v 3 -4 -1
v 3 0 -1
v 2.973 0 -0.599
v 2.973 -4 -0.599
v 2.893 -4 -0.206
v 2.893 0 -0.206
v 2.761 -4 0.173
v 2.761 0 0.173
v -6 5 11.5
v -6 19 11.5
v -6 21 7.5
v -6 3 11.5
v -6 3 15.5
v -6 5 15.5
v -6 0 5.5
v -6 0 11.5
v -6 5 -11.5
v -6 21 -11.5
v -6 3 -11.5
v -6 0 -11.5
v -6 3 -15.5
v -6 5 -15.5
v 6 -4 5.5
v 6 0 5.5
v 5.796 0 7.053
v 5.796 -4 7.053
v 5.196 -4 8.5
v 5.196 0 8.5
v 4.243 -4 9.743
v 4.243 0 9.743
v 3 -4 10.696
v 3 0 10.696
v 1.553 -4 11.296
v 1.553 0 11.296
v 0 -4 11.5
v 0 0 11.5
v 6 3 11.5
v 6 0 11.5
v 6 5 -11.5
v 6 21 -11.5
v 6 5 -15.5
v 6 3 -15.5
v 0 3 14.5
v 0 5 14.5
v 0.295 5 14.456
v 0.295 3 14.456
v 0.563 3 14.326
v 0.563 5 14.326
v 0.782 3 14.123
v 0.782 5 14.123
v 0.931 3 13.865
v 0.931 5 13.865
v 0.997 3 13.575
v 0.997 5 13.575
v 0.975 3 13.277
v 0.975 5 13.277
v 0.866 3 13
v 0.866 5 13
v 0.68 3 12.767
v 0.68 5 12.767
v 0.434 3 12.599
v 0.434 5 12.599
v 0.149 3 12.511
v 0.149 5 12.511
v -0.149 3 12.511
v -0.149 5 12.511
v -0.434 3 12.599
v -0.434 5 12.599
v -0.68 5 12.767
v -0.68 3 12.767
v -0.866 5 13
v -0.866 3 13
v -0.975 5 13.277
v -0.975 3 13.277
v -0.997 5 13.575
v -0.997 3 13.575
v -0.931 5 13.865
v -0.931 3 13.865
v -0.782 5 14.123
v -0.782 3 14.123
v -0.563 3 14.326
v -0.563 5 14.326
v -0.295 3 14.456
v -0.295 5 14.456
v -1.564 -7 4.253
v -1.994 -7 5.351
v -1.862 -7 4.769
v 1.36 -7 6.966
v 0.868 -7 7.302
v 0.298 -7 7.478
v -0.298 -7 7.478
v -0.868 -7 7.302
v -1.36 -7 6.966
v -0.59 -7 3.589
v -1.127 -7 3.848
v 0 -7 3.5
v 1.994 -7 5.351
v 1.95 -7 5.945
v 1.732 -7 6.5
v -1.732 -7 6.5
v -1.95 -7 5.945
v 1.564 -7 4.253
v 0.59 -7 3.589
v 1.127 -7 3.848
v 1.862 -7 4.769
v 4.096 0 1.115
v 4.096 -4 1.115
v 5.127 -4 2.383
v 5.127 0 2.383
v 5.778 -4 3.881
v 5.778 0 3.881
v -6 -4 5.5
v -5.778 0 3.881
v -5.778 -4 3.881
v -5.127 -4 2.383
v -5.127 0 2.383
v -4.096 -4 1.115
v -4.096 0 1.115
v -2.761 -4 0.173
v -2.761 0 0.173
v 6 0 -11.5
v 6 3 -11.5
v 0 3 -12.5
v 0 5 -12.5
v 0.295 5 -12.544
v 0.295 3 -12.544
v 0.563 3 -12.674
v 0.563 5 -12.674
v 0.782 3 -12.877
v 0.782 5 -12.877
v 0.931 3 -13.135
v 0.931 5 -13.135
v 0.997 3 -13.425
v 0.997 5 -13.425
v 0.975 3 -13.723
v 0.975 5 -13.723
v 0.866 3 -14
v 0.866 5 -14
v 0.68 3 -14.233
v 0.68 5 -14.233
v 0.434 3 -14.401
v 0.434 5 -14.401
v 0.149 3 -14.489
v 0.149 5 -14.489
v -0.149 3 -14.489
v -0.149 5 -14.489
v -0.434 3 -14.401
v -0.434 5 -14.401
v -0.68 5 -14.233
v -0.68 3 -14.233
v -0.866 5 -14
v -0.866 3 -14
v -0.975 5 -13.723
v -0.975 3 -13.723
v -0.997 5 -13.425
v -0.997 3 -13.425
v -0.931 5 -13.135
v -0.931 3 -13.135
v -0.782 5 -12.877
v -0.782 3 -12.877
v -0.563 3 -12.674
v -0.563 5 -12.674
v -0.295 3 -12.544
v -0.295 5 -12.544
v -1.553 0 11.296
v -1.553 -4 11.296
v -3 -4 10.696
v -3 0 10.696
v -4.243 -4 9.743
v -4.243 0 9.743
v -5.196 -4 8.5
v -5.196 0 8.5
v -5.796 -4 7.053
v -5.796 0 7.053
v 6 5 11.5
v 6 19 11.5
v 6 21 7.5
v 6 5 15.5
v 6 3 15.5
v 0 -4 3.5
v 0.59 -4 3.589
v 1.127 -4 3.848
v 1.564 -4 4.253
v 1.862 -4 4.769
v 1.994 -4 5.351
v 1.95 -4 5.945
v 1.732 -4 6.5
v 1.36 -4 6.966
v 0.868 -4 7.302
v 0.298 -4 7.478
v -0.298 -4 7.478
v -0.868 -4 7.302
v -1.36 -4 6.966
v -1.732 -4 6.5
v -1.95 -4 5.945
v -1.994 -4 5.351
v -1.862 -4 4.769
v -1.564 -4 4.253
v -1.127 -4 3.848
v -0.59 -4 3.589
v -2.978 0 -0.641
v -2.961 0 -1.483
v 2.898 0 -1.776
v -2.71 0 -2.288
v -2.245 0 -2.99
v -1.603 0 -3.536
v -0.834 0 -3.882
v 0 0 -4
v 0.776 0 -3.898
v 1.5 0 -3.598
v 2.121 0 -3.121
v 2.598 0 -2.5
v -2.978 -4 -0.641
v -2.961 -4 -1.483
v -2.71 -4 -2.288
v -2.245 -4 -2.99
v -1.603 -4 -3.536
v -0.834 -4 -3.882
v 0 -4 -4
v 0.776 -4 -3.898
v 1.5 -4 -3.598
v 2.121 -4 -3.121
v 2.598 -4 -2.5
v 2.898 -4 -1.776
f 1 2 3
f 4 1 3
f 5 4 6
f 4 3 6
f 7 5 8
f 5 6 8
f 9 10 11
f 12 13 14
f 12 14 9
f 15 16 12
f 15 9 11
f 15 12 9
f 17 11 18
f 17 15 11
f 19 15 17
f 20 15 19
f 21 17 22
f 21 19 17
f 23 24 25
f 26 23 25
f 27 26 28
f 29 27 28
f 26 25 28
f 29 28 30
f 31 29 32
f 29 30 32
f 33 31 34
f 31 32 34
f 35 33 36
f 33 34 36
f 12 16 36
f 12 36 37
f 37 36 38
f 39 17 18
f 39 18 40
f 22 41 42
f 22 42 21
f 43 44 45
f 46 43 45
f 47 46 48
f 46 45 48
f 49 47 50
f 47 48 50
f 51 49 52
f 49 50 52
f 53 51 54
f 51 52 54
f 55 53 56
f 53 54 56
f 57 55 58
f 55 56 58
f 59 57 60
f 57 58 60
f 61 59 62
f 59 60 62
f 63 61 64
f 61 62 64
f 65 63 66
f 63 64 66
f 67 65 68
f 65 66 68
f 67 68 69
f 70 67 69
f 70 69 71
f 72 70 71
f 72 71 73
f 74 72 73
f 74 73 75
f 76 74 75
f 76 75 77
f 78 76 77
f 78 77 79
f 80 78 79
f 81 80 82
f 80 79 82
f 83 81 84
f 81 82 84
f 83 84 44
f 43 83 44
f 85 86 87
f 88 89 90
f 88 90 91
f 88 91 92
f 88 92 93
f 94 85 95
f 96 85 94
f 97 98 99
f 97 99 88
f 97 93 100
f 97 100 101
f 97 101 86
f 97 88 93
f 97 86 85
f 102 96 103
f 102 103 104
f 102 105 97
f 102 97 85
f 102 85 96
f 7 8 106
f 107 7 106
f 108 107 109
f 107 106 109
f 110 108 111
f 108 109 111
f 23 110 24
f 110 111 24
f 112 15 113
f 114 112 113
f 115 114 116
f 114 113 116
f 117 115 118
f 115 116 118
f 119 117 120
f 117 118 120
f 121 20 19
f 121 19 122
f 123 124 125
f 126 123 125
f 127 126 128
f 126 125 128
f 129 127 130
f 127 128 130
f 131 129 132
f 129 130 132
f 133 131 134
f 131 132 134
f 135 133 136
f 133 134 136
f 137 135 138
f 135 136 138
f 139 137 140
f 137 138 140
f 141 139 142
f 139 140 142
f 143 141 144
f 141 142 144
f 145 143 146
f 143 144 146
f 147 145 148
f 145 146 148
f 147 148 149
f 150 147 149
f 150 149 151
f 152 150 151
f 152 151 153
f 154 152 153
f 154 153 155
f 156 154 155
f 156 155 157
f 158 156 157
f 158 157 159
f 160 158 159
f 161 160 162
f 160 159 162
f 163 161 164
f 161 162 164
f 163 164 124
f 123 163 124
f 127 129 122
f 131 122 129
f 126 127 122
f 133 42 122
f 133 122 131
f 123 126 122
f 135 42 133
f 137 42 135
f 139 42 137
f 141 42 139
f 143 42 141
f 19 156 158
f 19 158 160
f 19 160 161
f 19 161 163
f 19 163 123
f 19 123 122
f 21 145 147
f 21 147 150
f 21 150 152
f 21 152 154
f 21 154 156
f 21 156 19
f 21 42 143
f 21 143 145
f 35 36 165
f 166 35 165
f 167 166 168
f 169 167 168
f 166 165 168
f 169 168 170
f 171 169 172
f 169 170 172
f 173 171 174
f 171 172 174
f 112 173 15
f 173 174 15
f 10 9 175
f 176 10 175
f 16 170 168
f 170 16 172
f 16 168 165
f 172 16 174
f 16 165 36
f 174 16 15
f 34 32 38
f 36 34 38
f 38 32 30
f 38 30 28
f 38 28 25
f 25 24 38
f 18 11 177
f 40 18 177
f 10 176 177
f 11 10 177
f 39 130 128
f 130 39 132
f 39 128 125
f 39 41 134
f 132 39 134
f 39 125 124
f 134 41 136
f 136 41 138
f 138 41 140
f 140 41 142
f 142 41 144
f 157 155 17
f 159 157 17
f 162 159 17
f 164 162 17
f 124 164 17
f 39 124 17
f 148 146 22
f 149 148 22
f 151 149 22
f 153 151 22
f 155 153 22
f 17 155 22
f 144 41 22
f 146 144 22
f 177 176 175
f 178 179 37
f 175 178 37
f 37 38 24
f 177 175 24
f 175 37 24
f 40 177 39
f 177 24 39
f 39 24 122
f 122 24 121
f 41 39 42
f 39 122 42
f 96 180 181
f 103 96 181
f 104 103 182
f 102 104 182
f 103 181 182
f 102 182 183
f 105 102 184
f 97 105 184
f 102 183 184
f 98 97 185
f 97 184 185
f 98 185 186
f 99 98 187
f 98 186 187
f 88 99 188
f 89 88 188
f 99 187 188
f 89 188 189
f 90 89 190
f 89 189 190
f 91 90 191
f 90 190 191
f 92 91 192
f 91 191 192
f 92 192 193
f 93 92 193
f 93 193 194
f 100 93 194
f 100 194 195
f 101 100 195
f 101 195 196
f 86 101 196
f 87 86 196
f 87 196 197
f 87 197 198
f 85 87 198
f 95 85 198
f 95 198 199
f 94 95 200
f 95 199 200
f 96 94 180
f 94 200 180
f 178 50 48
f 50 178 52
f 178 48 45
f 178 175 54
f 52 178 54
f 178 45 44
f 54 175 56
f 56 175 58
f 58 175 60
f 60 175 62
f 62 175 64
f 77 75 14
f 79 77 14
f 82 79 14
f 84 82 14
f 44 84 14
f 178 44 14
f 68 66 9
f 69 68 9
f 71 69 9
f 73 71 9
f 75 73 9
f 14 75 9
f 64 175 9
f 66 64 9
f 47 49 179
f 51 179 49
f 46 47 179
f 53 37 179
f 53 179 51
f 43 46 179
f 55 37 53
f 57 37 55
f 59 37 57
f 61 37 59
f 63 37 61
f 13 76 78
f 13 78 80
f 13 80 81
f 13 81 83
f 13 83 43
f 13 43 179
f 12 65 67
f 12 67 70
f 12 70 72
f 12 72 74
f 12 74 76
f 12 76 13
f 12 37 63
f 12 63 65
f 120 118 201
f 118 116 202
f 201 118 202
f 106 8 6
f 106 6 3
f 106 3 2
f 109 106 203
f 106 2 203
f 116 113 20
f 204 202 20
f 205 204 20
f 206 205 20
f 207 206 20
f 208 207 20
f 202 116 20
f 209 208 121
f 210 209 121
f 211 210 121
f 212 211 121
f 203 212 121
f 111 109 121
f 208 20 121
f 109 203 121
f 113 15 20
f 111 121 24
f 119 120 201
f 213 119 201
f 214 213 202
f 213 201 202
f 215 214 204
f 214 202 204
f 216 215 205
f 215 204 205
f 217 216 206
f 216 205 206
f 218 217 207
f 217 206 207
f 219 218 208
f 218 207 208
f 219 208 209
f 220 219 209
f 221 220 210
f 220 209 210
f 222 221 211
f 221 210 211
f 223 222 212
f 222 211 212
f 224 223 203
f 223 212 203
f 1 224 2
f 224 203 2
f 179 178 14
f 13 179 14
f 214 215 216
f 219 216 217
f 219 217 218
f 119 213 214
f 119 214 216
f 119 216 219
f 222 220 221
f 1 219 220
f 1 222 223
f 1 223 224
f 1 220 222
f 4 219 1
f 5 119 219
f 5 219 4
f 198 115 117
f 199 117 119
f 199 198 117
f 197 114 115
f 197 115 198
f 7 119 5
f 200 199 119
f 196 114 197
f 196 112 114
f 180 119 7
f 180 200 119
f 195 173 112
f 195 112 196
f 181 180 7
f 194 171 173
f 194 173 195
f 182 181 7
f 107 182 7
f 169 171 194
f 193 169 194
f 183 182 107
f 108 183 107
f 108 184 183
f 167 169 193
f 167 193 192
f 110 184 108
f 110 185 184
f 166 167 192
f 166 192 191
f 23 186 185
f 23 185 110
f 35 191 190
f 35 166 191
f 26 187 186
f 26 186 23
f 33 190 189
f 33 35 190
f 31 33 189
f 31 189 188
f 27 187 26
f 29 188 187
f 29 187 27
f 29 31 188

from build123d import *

# Parameters (mm, degrees)
SKETCH_1_W          = 12
SKETCH_1_H          = 23
EXTRUDE_1_DEPTH     = 21
SKETCH_2_W          = 12
SKETCH_2_H          = 4
EXTRUDE_2_DEPTH     = 2
SKETCH_3_R          = 1
CUT_EXTRUDE_2_DEPTH = 2
SKETCH_4_R          = 1
CUT_EXTRUDE_3_DEPTH = 2
EXTRUDE_3_DEPTH     = 4
SKETCH_6_R          = 2
EXTRUDE_4_DEPTH     = 3
CUT_EXTRUDE_4_DEPTH = 29.727164844


with BuildPart() as part:
    # 草图1 → 凸台-拉伸1 (new body)
    with BuildSketch(Plane(origin=(0, 0, 0), x_dir=(1, 0, 0), z_dir=(0, 1, 0))):
        Rectangle(SKETCH_1_W, SKETCH_1_H)
    extrude(amount=EXTRUDE_1_DEPTH)

    # 草图2 → 凸台-拉伸2 (add)
    with BuildSketch(Plane(origin=(0, 5, 0), x_dir=(-1, 0, 0), z_dir=(0, -1, 0))):
        with Locations((0, -13.5)):
            Rectangle(SKETCH_2_W, SKETCH_2_H)
        with Locations((0, 13.5)):
            Rectangle(SKETCH_2_W, SKETCH_2_H)
    extrude(amount=EXTRUDE_2_DEPTH)

    # 草图3 → 切除-拉伸2 (cut)
    with BuildSketch(Plane(origin=(0, 5, 0), x_dir=(1, 0, 0), z_dir=(0, 1, 0))):
        with Locations(Location((0, -13.5, 0), (0, 0, 270))):
            Circle(SKETCH_3_R)
    extrude(amount=-CUT_EXTRUDE_2_DEPTH, mode=Mode.SUBTRACT)

    # 草图4 → 切除-拉伸3 (cut)
    with BuildSketch(Plane(origin=(0, 5, 0), x_dir=(1, 0, 0), z_dir=(0, 1, 0))):
        with Locations(Location((0, 13.5, 0), (0, 0, 270))):
            Circle(SKETCH_4_R)
    extrude(amount=-CUT_EXTRUDE_3_DEPTH, mode=Mode.SUBTRACT)

    # 草图5 → 凸台-拉伸3 (add)
    with BuildSketch(Plane.XZ):
        with BuildLine():
            ThreePointArc((6, 5.5), (4.242640687, 9.742640687), (0, 11.5))
            Line((0, 11.5), (0, 2))
            ThreePointArc((0, 2), (1.655410709, 1.501922338), (2.761139354, 0.173076923))
            ThreePointArc((2.761139354, 0.173076923), (5.126735615, 2.382856767), (6, 5.5))
        make_face()
        with BuildLine():
            Line((0, 2), (0, 11.5))
            ThreePointArc((0, 11.5), (-4.242640687, 9.742640687), (-6, 5.5))
            ThreePointArc((-6, 5.5), (-5.126735615, 2.382856767), (-2.761139354, 0.173076923))
            ThreePointArc((-2.761139354, 0.173076923), (-1.655410709, 1.501922338), (0, 2))
        make_face()
        with BuildLine():
            ThreePointArc((2.761139354, 0.173076923), (1.655410709, 1.501922338), (0, 2))
            Line((0, 2), (0, -0.5))
            ThreePointArc((0, -0.5), (1.4209964, -0.329302637), (2.761139354, 0.173076923))
        make_face()
        with BuildLine():
            Line((0, -0.5), (0, 2))
            ThreePointArc((0, 2), (-1.655410709, 1.501922338), (-2.761139354, 0.173076923))
            ThreePointArc((-2.761139354, 0.173076923), (-1.4209964, -0.329302637), (0, -0.5))
        make_face()
        with BuildLine():
            ThreePointArc((2.761139354, 0.173076923), (1.4209964, -0.329302637), (0, -0.5))
            Line((0, -0.5), (0, -4))
            ThreePointArc((0, -4), (2.121320344, -3.121320344), (3, -1))
            ThreePointArc((3, -1), (2.939678389, -0.401425887), (2.761139354, 0.173076923))
        make_face()
        with BuildLine():
            Line((0, -4), (0, -0.5))
            ThreePointArc((0, -0.5), (-1.4209964, -0.329302637), (-2.761139354, 0.173076923))
            ThreePointArc((-2.761139354, 0.173076923), (-2.501922338, -2.655410709), (0, -4))
        make_face()
        with BuildLine():
            ThreePointArc((6, 5.5), (4.242640687, 9.742640687), (0, 11.5))
            Line((0, 11.5), (0, 2))
            ThreePointArc((0, 2), (1.655410709, 1.501922338), (2.761139354, 0.173076923))
            ThreePointArc((2.761139354, 0.173076923), (5.126735615, 2.382856767), (6, 5.5))
        make_face()
        with BuildLine():
            Line((0, 2), (0, 11.5))
            ThreePointArc((0, 11.5), (-4.242640687, 9.742640687), (-6, 5.5))
            ThreePointArc((-6, 5.5), (-5.126735615, 2.382856767), (-2.761139354, 0.173076923))
            ThreePointArc((-2.761139354, 0.173076923), (-1.655410709, 1.501922338), (0, 2))
        make_face()
        with BuildLine():
            ThreePointArc((2.761139354, 0.173076923), (1.655410709, 1.501922338), (0, 2))
            Line((0, 2), (0, -0.5))
            ThreePointArc((0, -0.5), (1.4209964, -0.329302637), (2.761139354, 0.173076923))
        make_face()
        with BuildLine():
            Line((0, -0.5), (0, 2))
            ThreePointArc((0, 2), (-1.655410709, 1.501922338), (-2.761139354, 0.173076923))
            ThreePointArc((-2.761139354, 0.173076923), (-1.4209964, -0.329302637), (0, -0.5))
        make_face()
        with BuildLine():
            ThreePointArc((2.761139354, 0.173076923), (1.4209964, -0.329302637), (0, -0.5))
            Line((0, -0.5), (0, -4))
            ThreePointArc((0, -4), (2.121320344, -3.121320344), (3, -1))
            ThreePointArc((3, -1), (2.939678389, -0.401425887), (2.761139354, 0.173076923))
        make_face()
        with BuildLine():
            Line((0, -4), (0, -0.5))
            ThreePointArc((0, -0.5), (-1.4209964, -0.329302637), (-2.761139354, 0.173076923))
            ThreePointArc((-2.761139354, 0.173076923), (-2.501922338, -2.655410709), (0, -4))
        make_face()
        with BuildLine():
            ThreePointArc((6, 5.5), (4.242640687, 9.742640687), (0, 11.5))
            Line((0, 11.5), (0, 2))
            ThreePointArc((0, 2), (1.655410709, 1.501922338), (2.761139354, 0.173076923))
            ThreePointArc((2.761139354, 0.173076923), (5.126735615, 2.382856767), (6, 5.5))
        make_face()
        with BuildLine():
            Line((0, 2), (0, 11.5))
            ThreePointArc((0, 11.5), (-4.242640687, 9.742640687), (-6, 5.5))
            ThreePointArc((-6, 5.5), (-5.126735615, 2.382856767), (-2.761139354, 0.173076923))
            ThreePointArc((-2.761139354, 0.173076923), (-1.655410709, 1.501922338), (0, 2))
        make_face()
        with BuildLine():
            ThreePointArc((2.761139354, 0.173076923), (1.655410709, 1.501922338), (0, 2))
            Line((0, 2), (0, -0.5))
            ThreePointArc((0, -0.5), (1.4209964, -0.329302637), (2.761139354, 0.173076923))
        make_face()
        with BuildLine():
            Line((0, -0.5), (0, 2))
            ThreePointArc((0, 2), (-1.655410709, 1.501922338), (-2.761139354, 0.173076923))
            ThreePointArc((-2.761139354, 0.173076923), (-1.4209964, -0.329302637), (0, -0.5))
        make_face()
        with BuildLine():
            ThreePointArc((2.761139354, 0.173076923), (1.4209964, -0.329302637), (0, -0.5))
            Line((0, -0.5), (0, -4))
            ThreePointArc((0, -4), (2.121320344, -3.121320344), (3, -1))
            ThreePointArc((3, -1), (2.939678389, -0.401425887), (2.761139354, 0.173076923))
        make_face()
        with BuildLine():
            Line((0, -4), (0, -0.5))
            ThreePointArc((0, -0.5), (-1.4209964, -0.329302637), (-2.761139354, 0.173076923))
            ThreePointArc((-2.761139354, 0.173076923), (-2.501922338, -2.655410709), (0, -4))
        make_face()
    extrude(amount=EXTRUDE_3_DEPTH)

    # 草图6 → 凸台-拉伸4 (add)
    with BuildSketch(Plane.XZ.offset(4)):
        with Locations(Location((0, 5.5, 0), (0, 0, 270))):
            Circle(SKETCH_6_R)
    extrude(amount=EXTRUDE_4_DEPTH)

    # 草图7 → 切除-拉伸4 (cut, through all)
    with BuildSketch(Plane(origin=(6, 0, 0), x_dir=(0, 0, -1), z_dir=(1, 0, 0))):
        Polygon((-11.5, 21), (-11.5, 19), (-7.5, 21), align=None)
    extrude(amount=-CUT_EXTRUDE_4_DEPTH, mode=Mode.SUBTRACT)


solid = part.part
